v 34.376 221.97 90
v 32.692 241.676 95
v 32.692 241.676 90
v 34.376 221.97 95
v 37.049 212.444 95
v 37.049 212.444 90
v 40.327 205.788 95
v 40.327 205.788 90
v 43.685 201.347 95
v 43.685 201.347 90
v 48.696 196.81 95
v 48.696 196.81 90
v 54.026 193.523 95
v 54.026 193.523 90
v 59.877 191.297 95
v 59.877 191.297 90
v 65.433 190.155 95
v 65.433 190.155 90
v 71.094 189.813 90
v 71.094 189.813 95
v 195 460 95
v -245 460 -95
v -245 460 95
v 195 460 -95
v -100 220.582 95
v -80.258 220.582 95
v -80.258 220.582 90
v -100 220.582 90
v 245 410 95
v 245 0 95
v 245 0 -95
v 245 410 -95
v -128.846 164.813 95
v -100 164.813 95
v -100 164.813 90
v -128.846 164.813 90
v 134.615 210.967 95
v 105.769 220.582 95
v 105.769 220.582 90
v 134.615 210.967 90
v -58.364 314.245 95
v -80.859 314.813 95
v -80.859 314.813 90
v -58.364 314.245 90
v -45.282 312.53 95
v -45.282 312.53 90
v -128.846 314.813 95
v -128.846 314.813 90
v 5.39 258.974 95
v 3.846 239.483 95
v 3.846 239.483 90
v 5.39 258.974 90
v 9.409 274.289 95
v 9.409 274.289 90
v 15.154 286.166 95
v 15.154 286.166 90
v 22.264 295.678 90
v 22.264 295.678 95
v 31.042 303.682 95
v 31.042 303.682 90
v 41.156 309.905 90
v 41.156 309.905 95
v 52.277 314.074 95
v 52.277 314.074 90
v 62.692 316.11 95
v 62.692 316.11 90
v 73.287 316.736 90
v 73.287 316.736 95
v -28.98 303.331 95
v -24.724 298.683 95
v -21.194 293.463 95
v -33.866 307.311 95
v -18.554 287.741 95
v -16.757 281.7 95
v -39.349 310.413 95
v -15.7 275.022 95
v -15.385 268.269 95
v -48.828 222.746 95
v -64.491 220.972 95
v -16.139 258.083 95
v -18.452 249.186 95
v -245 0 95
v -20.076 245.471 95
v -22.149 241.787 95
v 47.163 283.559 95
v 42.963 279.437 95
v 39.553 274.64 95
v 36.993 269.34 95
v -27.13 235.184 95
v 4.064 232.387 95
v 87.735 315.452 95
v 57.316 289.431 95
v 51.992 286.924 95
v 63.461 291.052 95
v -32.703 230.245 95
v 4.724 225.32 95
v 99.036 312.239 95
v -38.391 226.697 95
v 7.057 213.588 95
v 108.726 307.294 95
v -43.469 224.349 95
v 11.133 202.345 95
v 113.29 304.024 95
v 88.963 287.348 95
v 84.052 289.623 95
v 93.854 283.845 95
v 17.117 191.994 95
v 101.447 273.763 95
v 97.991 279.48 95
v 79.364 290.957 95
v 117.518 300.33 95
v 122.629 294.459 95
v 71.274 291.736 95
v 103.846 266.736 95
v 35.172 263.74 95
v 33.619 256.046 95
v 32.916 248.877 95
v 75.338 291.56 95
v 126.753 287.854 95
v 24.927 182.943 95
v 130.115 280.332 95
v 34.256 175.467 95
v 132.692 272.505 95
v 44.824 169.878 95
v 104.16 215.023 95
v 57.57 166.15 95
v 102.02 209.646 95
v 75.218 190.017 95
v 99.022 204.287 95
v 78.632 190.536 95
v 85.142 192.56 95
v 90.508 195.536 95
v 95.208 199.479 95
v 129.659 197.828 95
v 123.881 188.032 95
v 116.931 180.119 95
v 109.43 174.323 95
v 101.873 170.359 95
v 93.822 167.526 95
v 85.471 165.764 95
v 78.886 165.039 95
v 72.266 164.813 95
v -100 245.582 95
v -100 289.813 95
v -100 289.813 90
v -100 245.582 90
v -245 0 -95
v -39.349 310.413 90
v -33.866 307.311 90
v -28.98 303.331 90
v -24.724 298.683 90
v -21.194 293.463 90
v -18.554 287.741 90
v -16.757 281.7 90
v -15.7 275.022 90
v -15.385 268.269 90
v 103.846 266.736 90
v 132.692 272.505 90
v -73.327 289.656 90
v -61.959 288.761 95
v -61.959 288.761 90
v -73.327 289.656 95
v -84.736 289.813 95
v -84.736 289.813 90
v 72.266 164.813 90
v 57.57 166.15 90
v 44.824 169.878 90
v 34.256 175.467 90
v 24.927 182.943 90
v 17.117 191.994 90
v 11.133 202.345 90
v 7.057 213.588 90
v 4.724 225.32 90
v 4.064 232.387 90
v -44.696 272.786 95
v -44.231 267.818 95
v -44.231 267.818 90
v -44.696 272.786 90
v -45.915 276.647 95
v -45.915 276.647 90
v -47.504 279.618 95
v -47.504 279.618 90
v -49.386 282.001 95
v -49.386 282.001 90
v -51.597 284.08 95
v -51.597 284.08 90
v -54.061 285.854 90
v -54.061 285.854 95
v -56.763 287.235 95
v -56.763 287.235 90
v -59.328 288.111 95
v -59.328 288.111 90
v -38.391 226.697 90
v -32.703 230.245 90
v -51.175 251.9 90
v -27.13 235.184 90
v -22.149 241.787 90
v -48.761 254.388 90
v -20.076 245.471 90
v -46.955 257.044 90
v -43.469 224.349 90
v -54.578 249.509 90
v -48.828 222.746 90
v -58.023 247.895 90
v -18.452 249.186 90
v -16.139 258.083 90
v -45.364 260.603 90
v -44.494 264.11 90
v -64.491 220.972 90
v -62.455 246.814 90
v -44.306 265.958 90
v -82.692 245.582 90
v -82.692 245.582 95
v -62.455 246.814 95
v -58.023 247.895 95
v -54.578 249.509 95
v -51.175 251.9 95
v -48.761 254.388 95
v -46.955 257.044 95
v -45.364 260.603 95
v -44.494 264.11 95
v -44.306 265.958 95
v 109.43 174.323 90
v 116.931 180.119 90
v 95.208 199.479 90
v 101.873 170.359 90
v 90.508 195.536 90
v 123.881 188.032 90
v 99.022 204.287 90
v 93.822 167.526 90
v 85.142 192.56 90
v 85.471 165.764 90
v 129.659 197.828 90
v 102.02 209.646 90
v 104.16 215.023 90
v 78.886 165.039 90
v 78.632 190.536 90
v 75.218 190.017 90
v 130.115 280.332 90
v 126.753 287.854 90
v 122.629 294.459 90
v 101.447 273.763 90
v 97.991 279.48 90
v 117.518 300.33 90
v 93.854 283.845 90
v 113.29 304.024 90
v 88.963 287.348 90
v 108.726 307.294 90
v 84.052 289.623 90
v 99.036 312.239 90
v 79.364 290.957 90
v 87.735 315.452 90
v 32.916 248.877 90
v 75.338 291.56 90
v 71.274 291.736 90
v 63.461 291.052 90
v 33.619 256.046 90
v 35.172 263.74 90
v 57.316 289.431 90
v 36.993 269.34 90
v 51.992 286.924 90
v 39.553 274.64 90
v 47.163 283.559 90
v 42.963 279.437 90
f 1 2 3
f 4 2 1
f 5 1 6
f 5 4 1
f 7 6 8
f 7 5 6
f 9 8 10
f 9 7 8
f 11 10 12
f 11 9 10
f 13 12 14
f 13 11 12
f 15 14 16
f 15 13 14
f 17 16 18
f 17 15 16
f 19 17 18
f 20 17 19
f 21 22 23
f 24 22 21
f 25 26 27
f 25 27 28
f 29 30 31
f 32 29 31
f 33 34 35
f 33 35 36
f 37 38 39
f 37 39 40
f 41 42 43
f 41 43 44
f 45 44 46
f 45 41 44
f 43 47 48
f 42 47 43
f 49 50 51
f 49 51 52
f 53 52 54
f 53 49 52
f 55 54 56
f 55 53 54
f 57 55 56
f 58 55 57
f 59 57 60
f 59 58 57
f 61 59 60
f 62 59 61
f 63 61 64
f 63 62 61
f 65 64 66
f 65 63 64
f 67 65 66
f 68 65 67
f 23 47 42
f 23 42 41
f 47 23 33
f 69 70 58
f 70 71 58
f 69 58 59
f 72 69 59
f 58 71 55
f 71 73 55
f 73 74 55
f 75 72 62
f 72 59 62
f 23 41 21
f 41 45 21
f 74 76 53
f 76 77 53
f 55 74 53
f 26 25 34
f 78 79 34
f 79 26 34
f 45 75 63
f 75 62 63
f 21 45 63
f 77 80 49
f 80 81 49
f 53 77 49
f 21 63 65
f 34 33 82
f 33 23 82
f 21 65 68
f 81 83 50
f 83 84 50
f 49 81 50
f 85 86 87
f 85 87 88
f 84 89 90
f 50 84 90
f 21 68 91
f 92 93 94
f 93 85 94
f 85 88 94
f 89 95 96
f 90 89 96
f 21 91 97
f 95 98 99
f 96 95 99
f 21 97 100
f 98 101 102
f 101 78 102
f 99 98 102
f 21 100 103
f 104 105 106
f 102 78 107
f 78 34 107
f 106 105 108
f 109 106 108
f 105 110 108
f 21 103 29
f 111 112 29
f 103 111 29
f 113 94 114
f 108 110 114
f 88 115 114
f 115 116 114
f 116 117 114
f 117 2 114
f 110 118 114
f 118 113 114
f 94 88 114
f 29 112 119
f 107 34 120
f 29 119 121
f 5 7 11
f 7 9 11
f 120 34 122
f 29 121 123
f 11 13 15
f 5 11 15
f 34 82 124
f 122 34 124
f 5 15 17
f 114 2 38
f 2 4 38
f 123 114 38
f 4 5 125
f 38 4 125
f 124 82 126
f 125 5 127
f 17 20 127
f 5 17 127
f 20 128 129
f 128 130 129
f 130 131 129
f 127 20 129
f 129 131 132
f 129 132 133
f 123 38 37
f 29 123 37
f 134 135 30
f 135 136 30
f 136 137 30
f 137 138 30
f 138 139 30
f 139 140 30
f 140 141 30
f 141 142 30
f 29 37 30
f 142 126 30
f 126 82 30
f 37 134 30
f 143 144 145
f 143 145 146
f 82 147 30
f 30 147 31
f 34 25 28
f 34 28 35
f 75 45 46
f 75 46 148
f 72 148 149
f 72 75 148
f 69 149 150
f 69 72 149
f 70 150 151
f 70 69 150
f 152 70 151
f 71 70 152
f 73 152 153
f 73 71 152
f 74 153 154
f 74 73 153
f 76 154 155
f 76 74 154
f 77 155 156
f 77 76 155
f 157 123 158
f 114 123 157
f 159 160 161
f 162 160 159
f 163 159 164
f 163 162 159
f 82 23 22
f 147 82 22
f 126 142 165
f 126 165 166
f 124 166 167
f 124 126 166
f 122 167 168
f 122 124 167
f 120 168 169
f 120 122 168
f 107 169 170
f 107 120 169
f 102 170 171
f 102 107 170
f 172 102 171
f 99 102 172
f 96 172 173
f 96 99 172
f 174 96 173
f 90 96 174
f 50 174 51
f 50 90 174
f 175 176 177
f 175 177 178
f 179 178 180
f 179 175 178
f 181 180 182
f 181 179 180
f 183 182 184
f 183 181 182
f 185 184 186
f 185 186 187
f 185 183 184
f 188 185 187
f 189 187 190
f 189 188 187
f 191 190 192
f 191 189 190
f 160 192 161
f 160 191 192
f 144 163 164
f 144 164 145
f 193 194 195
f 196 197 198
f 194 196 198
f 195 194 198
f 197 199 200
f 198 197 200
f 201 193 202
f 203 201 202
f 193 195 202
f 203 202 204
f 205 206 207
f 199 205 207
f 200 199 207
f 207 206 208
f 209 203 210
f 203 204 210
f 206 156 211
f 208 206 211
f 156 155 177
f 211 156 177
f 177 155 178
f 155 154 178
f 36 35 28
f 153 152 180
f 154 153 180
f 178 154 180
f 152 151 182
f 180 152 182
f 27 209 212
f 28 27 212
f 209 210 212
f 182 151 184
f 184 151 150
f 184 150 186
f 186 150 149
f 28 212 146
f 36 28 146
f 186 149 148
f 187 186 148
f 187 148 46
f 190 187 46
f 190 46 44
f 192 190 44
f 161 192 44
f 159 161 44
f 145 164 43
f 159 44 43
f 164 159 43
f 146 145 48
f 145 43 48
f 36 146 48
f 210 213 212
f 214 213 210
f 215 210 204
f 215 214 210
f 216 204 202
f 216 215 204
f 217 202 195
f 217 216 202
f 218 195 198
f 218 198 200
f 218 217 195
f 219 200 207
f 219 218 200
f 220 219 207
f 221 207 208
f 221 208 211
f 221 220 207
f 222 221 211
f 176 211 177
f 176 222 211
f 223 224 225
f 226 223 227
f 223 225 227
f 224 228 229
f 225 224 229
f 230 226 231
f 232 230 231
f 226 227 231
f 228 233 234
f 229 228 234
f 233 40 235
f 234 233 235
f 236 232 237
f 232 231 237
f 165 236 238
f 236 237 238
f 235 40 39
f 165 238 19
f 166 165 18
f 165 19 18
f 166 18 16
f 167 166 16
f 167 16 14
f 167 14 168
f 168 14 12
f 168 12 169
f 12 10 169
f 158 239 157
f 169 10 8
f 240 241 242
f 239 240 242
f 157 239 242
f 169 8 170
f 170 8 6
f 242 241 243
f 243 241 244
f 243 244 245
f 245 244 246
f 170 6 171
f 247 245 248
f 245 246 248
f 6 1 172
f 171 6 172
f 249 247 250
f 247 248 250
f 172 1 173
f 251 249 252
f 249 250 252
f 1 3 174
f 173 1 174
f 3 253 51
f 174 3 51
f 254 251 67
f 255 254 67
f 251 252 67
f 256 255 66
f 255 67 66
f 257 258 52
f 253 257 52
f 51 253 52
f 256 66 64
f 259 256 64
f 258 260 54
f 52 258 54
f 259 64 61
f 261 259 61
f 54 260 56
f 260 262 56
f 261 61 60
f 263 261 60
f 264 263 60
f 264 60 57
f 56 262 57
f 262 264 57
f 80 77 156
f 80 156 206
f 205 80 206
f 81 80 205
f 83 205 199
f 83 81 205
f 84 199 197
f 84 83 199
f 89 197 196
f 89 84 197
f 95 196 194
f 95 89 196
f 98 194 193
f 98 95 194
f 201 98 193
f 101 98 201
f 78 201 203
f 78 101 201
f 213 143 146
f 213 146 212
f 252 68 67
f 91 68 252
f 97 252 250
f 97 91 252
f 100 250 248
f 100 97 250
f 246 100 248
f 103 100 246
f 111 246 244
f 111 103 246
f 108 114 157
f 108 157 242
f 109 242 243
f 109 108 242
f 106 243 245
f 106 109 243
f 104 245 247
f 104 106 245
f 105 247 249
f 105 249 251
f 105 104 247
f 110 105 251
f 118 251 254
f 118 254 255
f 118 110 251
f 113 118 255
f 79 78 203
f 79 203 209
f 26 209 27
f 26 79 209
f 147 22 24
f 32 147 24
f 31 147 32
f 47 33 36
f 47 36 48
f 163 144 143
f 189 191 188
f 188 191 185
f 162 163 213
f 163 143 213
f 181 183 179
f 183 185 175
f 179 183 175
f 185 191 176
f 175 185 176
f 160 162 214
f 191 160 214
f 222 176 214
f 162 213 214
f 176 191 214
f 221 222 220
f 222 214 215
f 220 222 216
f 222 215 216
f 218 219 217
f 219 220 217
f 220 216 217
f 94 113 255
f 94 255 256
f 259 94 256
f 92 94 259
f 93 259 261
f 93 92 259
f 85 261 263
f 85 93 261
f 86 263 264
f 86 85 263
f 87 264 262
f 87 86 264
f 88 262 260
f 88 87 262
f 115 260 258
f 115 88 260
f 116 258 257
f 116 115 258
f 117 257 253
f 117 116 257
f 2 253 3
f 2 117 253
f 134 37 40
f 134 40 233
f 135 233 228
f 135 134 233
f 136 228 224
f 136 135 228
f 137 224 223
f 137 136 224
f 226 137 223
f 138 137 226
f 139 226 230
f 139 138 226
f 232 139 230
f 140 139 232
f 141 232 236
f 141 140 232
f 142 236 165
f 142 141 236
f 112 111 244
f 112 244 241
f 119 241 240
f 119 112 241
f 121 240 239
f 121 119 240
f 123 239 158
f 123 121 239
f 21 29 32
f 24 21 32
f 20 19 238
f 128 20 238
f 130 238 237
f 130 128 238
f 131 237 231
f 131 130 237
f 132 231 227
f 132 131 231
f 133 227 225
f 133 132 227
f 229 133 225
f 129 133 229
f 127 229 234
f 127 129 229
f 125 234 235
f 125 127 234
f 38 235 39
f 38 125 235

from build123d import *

# Parameters (mm, degrees)
SKETCH1_W           = 490
SKETCH1_H           = 190
BOSS_EXTRUDE1_DEPTH = 460
CUT_EXTRUDE1_DEPTH  = 5
CHAMFER1_SIZE       = 50


with BuildPart() as part:
    # Sketch1 → Boss-Extrude1 (new body)
    with BuildSketch(Plane(origin=(0, 0, 0), x_dir=(1, 0, 0), z_dir=(0, 1, 0))):
        Rectangle(SKETCH1_W, SKETCH1_H)
    extrude(amount=BOSS_EXTRUDE1_DEPTH)

    # Sketch2 → Cut-Extrude1 (cut)
    with BuildSketch(Plane.XY.offset(95)):
        with BuildLine():
            Line((-128.846153846, 164.813155142), (-128.846153846, 314.813155142))
            Line((-128.846153846, 314.813155142), (-80.859375, 314.813155142))
            add(Edge.make_bspline(
                [(-80.859375, 314.813155142), (-78.68582639, 314.810781524), (-74.52865628, 314.806241698), (-68.598704577, 314.680106304), (-63.259671472, 314.501547755), (-58.519480947, 314.279160637), (-54.361453517, 313.947316346), (-50.804241624, 313.563045651), (-47.825445739, 313.149672355), (-46.071321085, 312.721886279), (-45.282451923, 312.529501296)],
                knots=[0, 0, 0, 0, 0.006520502, 0.012471235, 0.0177928, 0.022546478, 0.026706265, 0.030303259, 0.033282265, 0.035716901, 0.035716901, 0.035716901, 0.035716901], degree=3))
            add(Edge.make_bspline(
                [(-45.282451923, 312.529501296), (-44.233447773, 312.230389788), (-42.1514203, 311.636723522), (-39.168524185, 310.371121346), (-36.293484672, 308.904355941), (-33.562423553, 307.156236707), (-30.966057094, 305.157798929), (-28.496667704, 302.925340129), (-26.141086485, 300.448782521), (-23.931899874, 297.733018398), (-21.908544821, 294.791742051), (-20.159857683, 291.620604869), (-18.694823491, 288.233390243), (-17.446638708, 284.655552667), (-16.525722022, 280.848731923), (-15.881247769, 276.839378235), (-15.432613274, 272.625737997), (-15.400848564, 269.742266274), (-15.384615385, 268.268683988)],
                knots=[0, 0, 0, 0, 0.003269584, 0.006489359, 0.009701272, 0.01294382, 0.016201231, 0.01952015, 0.022920764, 0.02644511, 0.030012235, 0.033616627, 0.037289997, 0.041071998, 0.044970961, 0.04902166, 0.053249372, 0.057668074, 0.057668074, 0.057668074, 0.057668074], degree=3))
            add(Edge.make_bspline(
                [(-15.384615385, 268.268683988), (-15.430912329, 266.030881754), (-15.520036489, 261.722989578), (-16.5171777, 255.54710401), (-18.038063347, 249.905830673), (-20.26094761, 244.85350674), (-22.971105302, 240.370306043), (-25.956399797, 236.328721789), (-29.365167403, 232.85057143), (-33.048040103, 229.879723989), (-36.940163439, 227.4485057), (-40.839332316, 225.375926626), (-44.798160315, 223.782461611), (-47.49728043, 223.088176089), (-48.828125, 222.74584745)],
                knots=[0, 0, 0, 0, 0.006707455, 0.012912219, 0.018715467, 0.024191971, 0.029407022, 0.034407026, 0.039230561, 0.043974923, 0.048567956, 0.052976328, 0.057211401, 0.061330619, 0.061330619, 0.061330619, 0.061330619], degree=3))
            add(Edge.make_bspline(
                [(-48.828125, 222.74584745), (-49.778016584, 222.565155747), (-51.780274709, 222.184279197), (-54.955736315, 221.804614598), (-58.426687949, 221.38436728), (-62.207405868, 221.110258367), (-66.29331639, 220.853566863), (-70.68283294, 220.73237433), (-75.36968243, 220.586361937), (-78.595608541, 220.583738277), (-80.258413462, 220.582385911)],
                knots=[0, 0, 0, 0, 0.002899912, 0.006112668, 0.009590206, 0.013388169, 0.017481771, 0.021871362, 0.026560403, 0.031548474, 0.031548474, 0.031548474, 0.031548474], degree=3))
            Line((-80.258413462, 220.582385911), (-100, 220.582385911))
            Line((-100, 220.582385911), (-100, 164.813155142))
            Line((-100, 164.813155142), (-128.846153846, 164.813155142))
        make_face()
        with BuildLine():
            Line((-100, 289.813155142), (-100, 245.582385911))
            Line((-100, 245.582385911), (-82.692307692, 245.582385911))
            add(Edge.make_bspline(
                [(-82.692307692, 245.582385911), (-81.199788789, 245.584318597), (-78.344412345, 245.588016069), (-74.247580544, 245.720733608), (-70.539124515, 245.882739977), (-67.211295568, 246.150893666), (-64.28418136, 246.504313816), (-61.738179725, 246.927048829), (-59.570323356, 247.380687664), (-57.226081821, 248.132439909), (-54.719618929, 249.34870649), (-52.043011123, 251.096787063), (-49.691614325, 253.186823554), (-47.734940523, 255.641499036), (-46.171991363, 258.368785716), (-45.052918625, 261.340733459), (-44.330334411, 264.508086695), (-44.26433293, 266.702194384), (-44.230769231, 267.817962834)],
                knots=[0, 0, 0, 0, 0.004477264, 0.00856557, 0.012295891, 0.015612224, 0.018578929, 0.021137784, 0.02335402, 0.025216517, 0.02850949, 0.031676392, 0.034783136, 0.037903799, 0.041053119, 0.044172624, 0.047402478, 0.05074444, 0.05074444, 0.05074444, 0.05074444], degree=3))
            add(Edge.make_bspline(
                [(-44.230769231, 267.817962834), (-44.278006455, 269.176951385), (-44.369593205, 271.811850999), (-45.379539397, 275.564387794), (-46.937770963, 278.969860429), (-49.16559971, 281.922309278), (-51.856764402, 284.405075963), (-54.881521201, 286.470826116), (-58.304465157, 287.916453798), (-60.726992003, 288.476581161), (-61.959134615, 288.76147245)],
                knots=[0, 0, 0, 0, 0.004067604, 0.007886548, 0.011569736, 0.015241631, 0.018898372, 0.022515267, 0.026176696, 0.029966568, 0.029966568, 0.029966568, 0.029966568], degree=3))
            add(Edge.make_bspline(
                [(-61.959134615, 288.76147245), (-62.489353732, 288.846276674), (-63.666275778, 289.03451576), (-65.622559738, 289.230966655), (-67.936843968, 289.409638547), (-70.611918115, 289.556333509), (-73.637178853, 289.671015001), (-77.022604854, 289.771504272), (-80.759279952, 289.779577251), (-83.373421904, 289.801652406), (-84.735576923, 289.813155142)],
                knots=[0, 0, 0, 0, 0.001610588, 0.003575006, 0.005895722, 0.008574218, 0.011611452, 0.014978044, 0.018734174, 0.022820823, 0.022820823, 0.022820823, 0.022820823], degree=3))
            Line((-84.735576923, 289.813155142), (-100, 289.813155142))
        make_face(mode=Mode.SUBTRACT)
        with BuildLine():
            Line((105.769230769, 220.582385911), (134.615384615, 210.967001296))
            add(Edge.make_bspline(
                [(134.615384615, 210.967001296), (134.029141984, 209.075631653), (132.881094494, 205.371734914), (130.773086835, 200.063171409), (128.362612777, 195.143483588), (125.736358285, 190.555089772), (122.731001789, 186.416523041), (119.514799096, 182.590757925), (115.992119669, 179.158372336), (112.18034538, 176.11203688), (108.116166692, 173.418096149), (103.752373829, 171.140664307), (99.15409023, 169.179171274), (94.2746867, 167.58994837), (89.146546246, 166.31722205), (83.745607291, 165.476579401), (78.097134874, 164.906595914), (74.24027675, 164.84479583), (72.265625, 164.813155142)],
                knots=[0, 0, 0, 0, 0.005938963, 0.011630357, 0.017113287, 0.022364828, 0.027468138, 0.032435168, 0.037343685, 0.042195961, 0.047054652, 0.051947232, 0.056942267, 0.062035394, 0.067326331, 0.072775067, 0.078420028, 0.084342245, 0.084342245, 0.084342245, 0.084342245], degree=3))
            add(Edge.make_bspline(
                [(72.265625, 164.813155142), (69.828320913, 164.863553304), (65.034070892, 164.962687995), (58.022934328, 165.96061555), (51.341638203, 167.517620504), (44.980624497, 169.673266776), (38.982352083, 172.52841479), (33.29209629, 175.965642858), (27.95126874, 180.054732283), (22.978605948, 184.72676615), (18.460821572, 189.946078551), (14.554106834, 195.684465819), (11.215954183, 201.861087994), (8.517887096, 208.505395954), (6.408180701, 215.610567139), (4.930326995, 223.166777517), (4.005580121, 231.1764073), (3.900224439, 236.665511085), (3.846153846, 239.482626296)],
                knots=[0, 0, 0, 0, 0.007307863, 0.014374785, 0.021196757, 0.02786743, 0.034480533, 0.041087011, 0.047775932, 0.054620829, 0.061523782, 0.068441368, 0.075405525, 0.082547871, 0.08991578, 0.097606033, 0.105619636, 0.114068491, 0.114068491, 0.114068491, 0.114068491], degree=3))
            add(Edge.make_bspline(
                [(3.846153846, 239.482626296), (3.899980719, 242.44994243), (4.004987128, 248.238634787), (4.931466399, 256.654897887), (6.369770291, 264.586735222), (8.483042384, 271.984966239), (11.141460959, 278.901657134), (14.483666479, 285.268146449), (18.351411861, 291.169316884), (22.848692346, 296.497007238), (27.844017445, 301.227275851), (33.197126129, 305.41011212), (38.957958096, 308.919211853), (45.094988778, 311.788769997), (51.61644901, 314.009375314), (58.509506337, 315.608385438), (65.7798005, 316.539112152), (70.750536696, 316.669626494), (73.287259615, 316.736232065)],
                knots=[0, 0, 0, 0, 0.008899305, 0.01736092, 0.025370015, 0.033055277, 0.040409694, 0.047559684, 0.054585153, 0.061537242, 0.068423432, 0.075191124, 0.081880179, 0.088614838, 0.095475545, 0.10250917, 0.10981042, 0.117419765, 0.117419765, 0.117419765, 0.117419765], degree=3))
            add(Edge.make_bspline(
                [(73.287259615, 316.736232065), (75.502677767, 316.680409273), (79.846299878, 316.57096126), (86.207093386, 315.827367435), (92.235345549, 314.522409911), (97.96364103, 312.761007439), (103.359371222, 310.436424746), (108.432202552, 307.59580863), (113.19957157, 304.254188874), (116.072009551, 301.643988063), (117.518028846, 300.329982065)],
                knots=[0, 0, 0, 0, 0.006646129, 0.013030621, 0.019177564, 0.025126932, 0.030982068, 0.036766615, 0.042544135, 0.048401044, 0.048401044, 0.048401044, 0.048401044], degree=3))
            add(Edge.make_bspline(
                [(117.518028846, 300.329982065), (118.356122646, 299.493866704), (120.05199646, 297.801996242), (122.316463998, 294.945639513), (124.463460545, 291.870771008), (126.458908982, 288.524937396), (128.239741929, 284.882854201), (129.8916547, 281.000452219), (131.412508813, 276.86276611), (132.25827859, 273.983192235), (132.692307692, 272.505462834)],
                knots=[0, 0, 0, 0, 0.003548855, 0.007181069, 0.010915382, 0.014795774, 0.018854045, 0.023067852, 0.027450032, 0.03206943, 0.03206943, 0.03206943, 0.03206943], degree=3))
            Line((132.692307692, 272.505462834), (103.846153846, 266.736232065))
            add(Edge.make_bspline(
                [(103.846153846, 266.736232065), (103.600973397, 267.682387584), (103.118032237, 269.54606572), (102.140866518, 272.224068854), (101.019980393, 274.765254654), (99.630744694, 277.107380608), (98.155017147, 279.354641299), (96.407838995, 281.407251388), (94.5007912, 283.319005273), (92.420135671, 285.070063602), (90.190676804, 286.62504353), (87.855339597, 288.022873638), (85.371678335, 289.163939789), (82.772731821, 290.087059632), (80.068851446, 290.861026069), (77.235964389, 291.339141204), (74.29840182, 291.706179115), (72.29693637, 291.726067579), (71.274038462, 291.736232065)],
                knots=[0, 0, 0, 0, 0.002930573, 0.005772461, 0.008542757, 0.011248585, 0.013932133, 0.016598296, 0.019317938, 0.022026435, 0.024744084, 0.027465053, 0.030180708, 0.032927601, 0.035734323, 0.038604662, 0.041538007, 0.044604236, 0.044604236, 0.044604236, 0.044604236], degree=3))
            add(Edge.make_bspline(
                [(71.274038462, 291.736232065), (69.86927788, 291.707862303), (67.127605565, 291.652493018), (63.120231411, 291.03516297), (59.300748387, 290.17361501), (55.684560232, 288.858035731), (52.294061085, 287.175420708), (49.090717698, 285.130014002), (46.092111739, 282.730576574), (43.297229728, 279.948683004), (40.789203011, 276.734035281), (38.584289533, 273.079996309), (36.755116153, 268.945080948), (35.27011826, 264.369865693), (34.101255741, 259.34347067), (33.266595883, 253.85944922), (32.80500389, 247.914049762), (32.7306837, 243.800308997), (32.692307692, 241.676135911)],
                knots=[0, 0, 0, 0, 0.004210592, 0.008217816, 0.012138946, 0.015940948, 0.019730463, 0.023473107, 0.027321138, 0.031230623, 0.035275969, 0.039522221, 0.044000997, 0.048809065, 0.053932857, 0.059465947, 0.06543486, 0.071807603, 0.071807603, 0.071807603, 0.071807603], degree=3))
            add(Edge.make_bspline(
                [(32.692307692, 241.676135911), (32.730305822, 239.421801013), (32.803522365, 235.078044909), (33.265016423, 228.812578486), (34.105013548, 223.050006886), (35.25834191, 217.780103579), (36.750823247, 213.00609642), (38.576903306, 208.736246769), (40.747764015, 204.965554134), (43.260027956, 201.696529353), (46.050180804, 198.888447148), (49.04265338, 196.474135787), (52.219790696, 194.409909096), (55.600711353, 192.711596469), (59.198274551, 191.426841862), (62.982913624, 190.495115298), (66.968515038, 189.902801915), (69.699399362, 189.843456212), (71.09375, 189.813155142)],
                knots=[0, 0, 0, 0, 0.006763221, 0.013031685, 0.018832209, 0.02421962, 0.029199268, 0.033815536, 0.038124058, 0.042216888, 0.046147677, 0.049972291, 0.053731184, 0.057493799, 0.061295801, 0.065165592, 0.069172816, 0.073353388, 0.073353388, 0.073353388, 0.073353388], degree=3))
            add(Edge.make_bspline(
                [(71.09375, 189.813155142), (72.126076347, 189.838910052), (74.155992848, 189.88955326), (77.156365937, 190.210981824), (80.036112192, 190.824381907), (82.809327067, 191.635492498), (85.48678539, 192.653197007), (88.02764717, 193.958707247), (90.48190273, 195.459197387), (92.798628231, 197.217656853), (95.0088458, 199.191863347), (97.024695379, 201.473554028), (98.894563209, 204.007905032), (100.59472722, 206.811853475), (102.181995284, 209.861398577), (103.532451036, 213.204053883), (104.790521611, 216.785800522), (105.437296252, 219.294753392), (105.769230769, 220.582385911)],
                knots=[0, 0, 0, 0, 0.003097285, 0.006090351, 0.009036902, 0.011917915, 0.014752645, 0.017614951, 0.020475206, 0.023371847, 0.02632895, 0.029350837, 0.032487948, 0.035765531, 0.039178998, 0.042789396, 0.046571398, 0.050558745, 0.050558745, 0.050558745, 0.050558745], degree=3))
        make_face()
    extrude(amount=-CUT_EXTRUDE1_DEPTH, mode=Mode.SUBTRACT)

    # Chamfer1
    chamfer1_edges = [part.edges().sort_by_distance(p)[0] for p in [
        (245, 460, 0),
    ]]
    chamfer(chamfer1_edges, length=CHAMFER1_SIZE)


solid = part.part
